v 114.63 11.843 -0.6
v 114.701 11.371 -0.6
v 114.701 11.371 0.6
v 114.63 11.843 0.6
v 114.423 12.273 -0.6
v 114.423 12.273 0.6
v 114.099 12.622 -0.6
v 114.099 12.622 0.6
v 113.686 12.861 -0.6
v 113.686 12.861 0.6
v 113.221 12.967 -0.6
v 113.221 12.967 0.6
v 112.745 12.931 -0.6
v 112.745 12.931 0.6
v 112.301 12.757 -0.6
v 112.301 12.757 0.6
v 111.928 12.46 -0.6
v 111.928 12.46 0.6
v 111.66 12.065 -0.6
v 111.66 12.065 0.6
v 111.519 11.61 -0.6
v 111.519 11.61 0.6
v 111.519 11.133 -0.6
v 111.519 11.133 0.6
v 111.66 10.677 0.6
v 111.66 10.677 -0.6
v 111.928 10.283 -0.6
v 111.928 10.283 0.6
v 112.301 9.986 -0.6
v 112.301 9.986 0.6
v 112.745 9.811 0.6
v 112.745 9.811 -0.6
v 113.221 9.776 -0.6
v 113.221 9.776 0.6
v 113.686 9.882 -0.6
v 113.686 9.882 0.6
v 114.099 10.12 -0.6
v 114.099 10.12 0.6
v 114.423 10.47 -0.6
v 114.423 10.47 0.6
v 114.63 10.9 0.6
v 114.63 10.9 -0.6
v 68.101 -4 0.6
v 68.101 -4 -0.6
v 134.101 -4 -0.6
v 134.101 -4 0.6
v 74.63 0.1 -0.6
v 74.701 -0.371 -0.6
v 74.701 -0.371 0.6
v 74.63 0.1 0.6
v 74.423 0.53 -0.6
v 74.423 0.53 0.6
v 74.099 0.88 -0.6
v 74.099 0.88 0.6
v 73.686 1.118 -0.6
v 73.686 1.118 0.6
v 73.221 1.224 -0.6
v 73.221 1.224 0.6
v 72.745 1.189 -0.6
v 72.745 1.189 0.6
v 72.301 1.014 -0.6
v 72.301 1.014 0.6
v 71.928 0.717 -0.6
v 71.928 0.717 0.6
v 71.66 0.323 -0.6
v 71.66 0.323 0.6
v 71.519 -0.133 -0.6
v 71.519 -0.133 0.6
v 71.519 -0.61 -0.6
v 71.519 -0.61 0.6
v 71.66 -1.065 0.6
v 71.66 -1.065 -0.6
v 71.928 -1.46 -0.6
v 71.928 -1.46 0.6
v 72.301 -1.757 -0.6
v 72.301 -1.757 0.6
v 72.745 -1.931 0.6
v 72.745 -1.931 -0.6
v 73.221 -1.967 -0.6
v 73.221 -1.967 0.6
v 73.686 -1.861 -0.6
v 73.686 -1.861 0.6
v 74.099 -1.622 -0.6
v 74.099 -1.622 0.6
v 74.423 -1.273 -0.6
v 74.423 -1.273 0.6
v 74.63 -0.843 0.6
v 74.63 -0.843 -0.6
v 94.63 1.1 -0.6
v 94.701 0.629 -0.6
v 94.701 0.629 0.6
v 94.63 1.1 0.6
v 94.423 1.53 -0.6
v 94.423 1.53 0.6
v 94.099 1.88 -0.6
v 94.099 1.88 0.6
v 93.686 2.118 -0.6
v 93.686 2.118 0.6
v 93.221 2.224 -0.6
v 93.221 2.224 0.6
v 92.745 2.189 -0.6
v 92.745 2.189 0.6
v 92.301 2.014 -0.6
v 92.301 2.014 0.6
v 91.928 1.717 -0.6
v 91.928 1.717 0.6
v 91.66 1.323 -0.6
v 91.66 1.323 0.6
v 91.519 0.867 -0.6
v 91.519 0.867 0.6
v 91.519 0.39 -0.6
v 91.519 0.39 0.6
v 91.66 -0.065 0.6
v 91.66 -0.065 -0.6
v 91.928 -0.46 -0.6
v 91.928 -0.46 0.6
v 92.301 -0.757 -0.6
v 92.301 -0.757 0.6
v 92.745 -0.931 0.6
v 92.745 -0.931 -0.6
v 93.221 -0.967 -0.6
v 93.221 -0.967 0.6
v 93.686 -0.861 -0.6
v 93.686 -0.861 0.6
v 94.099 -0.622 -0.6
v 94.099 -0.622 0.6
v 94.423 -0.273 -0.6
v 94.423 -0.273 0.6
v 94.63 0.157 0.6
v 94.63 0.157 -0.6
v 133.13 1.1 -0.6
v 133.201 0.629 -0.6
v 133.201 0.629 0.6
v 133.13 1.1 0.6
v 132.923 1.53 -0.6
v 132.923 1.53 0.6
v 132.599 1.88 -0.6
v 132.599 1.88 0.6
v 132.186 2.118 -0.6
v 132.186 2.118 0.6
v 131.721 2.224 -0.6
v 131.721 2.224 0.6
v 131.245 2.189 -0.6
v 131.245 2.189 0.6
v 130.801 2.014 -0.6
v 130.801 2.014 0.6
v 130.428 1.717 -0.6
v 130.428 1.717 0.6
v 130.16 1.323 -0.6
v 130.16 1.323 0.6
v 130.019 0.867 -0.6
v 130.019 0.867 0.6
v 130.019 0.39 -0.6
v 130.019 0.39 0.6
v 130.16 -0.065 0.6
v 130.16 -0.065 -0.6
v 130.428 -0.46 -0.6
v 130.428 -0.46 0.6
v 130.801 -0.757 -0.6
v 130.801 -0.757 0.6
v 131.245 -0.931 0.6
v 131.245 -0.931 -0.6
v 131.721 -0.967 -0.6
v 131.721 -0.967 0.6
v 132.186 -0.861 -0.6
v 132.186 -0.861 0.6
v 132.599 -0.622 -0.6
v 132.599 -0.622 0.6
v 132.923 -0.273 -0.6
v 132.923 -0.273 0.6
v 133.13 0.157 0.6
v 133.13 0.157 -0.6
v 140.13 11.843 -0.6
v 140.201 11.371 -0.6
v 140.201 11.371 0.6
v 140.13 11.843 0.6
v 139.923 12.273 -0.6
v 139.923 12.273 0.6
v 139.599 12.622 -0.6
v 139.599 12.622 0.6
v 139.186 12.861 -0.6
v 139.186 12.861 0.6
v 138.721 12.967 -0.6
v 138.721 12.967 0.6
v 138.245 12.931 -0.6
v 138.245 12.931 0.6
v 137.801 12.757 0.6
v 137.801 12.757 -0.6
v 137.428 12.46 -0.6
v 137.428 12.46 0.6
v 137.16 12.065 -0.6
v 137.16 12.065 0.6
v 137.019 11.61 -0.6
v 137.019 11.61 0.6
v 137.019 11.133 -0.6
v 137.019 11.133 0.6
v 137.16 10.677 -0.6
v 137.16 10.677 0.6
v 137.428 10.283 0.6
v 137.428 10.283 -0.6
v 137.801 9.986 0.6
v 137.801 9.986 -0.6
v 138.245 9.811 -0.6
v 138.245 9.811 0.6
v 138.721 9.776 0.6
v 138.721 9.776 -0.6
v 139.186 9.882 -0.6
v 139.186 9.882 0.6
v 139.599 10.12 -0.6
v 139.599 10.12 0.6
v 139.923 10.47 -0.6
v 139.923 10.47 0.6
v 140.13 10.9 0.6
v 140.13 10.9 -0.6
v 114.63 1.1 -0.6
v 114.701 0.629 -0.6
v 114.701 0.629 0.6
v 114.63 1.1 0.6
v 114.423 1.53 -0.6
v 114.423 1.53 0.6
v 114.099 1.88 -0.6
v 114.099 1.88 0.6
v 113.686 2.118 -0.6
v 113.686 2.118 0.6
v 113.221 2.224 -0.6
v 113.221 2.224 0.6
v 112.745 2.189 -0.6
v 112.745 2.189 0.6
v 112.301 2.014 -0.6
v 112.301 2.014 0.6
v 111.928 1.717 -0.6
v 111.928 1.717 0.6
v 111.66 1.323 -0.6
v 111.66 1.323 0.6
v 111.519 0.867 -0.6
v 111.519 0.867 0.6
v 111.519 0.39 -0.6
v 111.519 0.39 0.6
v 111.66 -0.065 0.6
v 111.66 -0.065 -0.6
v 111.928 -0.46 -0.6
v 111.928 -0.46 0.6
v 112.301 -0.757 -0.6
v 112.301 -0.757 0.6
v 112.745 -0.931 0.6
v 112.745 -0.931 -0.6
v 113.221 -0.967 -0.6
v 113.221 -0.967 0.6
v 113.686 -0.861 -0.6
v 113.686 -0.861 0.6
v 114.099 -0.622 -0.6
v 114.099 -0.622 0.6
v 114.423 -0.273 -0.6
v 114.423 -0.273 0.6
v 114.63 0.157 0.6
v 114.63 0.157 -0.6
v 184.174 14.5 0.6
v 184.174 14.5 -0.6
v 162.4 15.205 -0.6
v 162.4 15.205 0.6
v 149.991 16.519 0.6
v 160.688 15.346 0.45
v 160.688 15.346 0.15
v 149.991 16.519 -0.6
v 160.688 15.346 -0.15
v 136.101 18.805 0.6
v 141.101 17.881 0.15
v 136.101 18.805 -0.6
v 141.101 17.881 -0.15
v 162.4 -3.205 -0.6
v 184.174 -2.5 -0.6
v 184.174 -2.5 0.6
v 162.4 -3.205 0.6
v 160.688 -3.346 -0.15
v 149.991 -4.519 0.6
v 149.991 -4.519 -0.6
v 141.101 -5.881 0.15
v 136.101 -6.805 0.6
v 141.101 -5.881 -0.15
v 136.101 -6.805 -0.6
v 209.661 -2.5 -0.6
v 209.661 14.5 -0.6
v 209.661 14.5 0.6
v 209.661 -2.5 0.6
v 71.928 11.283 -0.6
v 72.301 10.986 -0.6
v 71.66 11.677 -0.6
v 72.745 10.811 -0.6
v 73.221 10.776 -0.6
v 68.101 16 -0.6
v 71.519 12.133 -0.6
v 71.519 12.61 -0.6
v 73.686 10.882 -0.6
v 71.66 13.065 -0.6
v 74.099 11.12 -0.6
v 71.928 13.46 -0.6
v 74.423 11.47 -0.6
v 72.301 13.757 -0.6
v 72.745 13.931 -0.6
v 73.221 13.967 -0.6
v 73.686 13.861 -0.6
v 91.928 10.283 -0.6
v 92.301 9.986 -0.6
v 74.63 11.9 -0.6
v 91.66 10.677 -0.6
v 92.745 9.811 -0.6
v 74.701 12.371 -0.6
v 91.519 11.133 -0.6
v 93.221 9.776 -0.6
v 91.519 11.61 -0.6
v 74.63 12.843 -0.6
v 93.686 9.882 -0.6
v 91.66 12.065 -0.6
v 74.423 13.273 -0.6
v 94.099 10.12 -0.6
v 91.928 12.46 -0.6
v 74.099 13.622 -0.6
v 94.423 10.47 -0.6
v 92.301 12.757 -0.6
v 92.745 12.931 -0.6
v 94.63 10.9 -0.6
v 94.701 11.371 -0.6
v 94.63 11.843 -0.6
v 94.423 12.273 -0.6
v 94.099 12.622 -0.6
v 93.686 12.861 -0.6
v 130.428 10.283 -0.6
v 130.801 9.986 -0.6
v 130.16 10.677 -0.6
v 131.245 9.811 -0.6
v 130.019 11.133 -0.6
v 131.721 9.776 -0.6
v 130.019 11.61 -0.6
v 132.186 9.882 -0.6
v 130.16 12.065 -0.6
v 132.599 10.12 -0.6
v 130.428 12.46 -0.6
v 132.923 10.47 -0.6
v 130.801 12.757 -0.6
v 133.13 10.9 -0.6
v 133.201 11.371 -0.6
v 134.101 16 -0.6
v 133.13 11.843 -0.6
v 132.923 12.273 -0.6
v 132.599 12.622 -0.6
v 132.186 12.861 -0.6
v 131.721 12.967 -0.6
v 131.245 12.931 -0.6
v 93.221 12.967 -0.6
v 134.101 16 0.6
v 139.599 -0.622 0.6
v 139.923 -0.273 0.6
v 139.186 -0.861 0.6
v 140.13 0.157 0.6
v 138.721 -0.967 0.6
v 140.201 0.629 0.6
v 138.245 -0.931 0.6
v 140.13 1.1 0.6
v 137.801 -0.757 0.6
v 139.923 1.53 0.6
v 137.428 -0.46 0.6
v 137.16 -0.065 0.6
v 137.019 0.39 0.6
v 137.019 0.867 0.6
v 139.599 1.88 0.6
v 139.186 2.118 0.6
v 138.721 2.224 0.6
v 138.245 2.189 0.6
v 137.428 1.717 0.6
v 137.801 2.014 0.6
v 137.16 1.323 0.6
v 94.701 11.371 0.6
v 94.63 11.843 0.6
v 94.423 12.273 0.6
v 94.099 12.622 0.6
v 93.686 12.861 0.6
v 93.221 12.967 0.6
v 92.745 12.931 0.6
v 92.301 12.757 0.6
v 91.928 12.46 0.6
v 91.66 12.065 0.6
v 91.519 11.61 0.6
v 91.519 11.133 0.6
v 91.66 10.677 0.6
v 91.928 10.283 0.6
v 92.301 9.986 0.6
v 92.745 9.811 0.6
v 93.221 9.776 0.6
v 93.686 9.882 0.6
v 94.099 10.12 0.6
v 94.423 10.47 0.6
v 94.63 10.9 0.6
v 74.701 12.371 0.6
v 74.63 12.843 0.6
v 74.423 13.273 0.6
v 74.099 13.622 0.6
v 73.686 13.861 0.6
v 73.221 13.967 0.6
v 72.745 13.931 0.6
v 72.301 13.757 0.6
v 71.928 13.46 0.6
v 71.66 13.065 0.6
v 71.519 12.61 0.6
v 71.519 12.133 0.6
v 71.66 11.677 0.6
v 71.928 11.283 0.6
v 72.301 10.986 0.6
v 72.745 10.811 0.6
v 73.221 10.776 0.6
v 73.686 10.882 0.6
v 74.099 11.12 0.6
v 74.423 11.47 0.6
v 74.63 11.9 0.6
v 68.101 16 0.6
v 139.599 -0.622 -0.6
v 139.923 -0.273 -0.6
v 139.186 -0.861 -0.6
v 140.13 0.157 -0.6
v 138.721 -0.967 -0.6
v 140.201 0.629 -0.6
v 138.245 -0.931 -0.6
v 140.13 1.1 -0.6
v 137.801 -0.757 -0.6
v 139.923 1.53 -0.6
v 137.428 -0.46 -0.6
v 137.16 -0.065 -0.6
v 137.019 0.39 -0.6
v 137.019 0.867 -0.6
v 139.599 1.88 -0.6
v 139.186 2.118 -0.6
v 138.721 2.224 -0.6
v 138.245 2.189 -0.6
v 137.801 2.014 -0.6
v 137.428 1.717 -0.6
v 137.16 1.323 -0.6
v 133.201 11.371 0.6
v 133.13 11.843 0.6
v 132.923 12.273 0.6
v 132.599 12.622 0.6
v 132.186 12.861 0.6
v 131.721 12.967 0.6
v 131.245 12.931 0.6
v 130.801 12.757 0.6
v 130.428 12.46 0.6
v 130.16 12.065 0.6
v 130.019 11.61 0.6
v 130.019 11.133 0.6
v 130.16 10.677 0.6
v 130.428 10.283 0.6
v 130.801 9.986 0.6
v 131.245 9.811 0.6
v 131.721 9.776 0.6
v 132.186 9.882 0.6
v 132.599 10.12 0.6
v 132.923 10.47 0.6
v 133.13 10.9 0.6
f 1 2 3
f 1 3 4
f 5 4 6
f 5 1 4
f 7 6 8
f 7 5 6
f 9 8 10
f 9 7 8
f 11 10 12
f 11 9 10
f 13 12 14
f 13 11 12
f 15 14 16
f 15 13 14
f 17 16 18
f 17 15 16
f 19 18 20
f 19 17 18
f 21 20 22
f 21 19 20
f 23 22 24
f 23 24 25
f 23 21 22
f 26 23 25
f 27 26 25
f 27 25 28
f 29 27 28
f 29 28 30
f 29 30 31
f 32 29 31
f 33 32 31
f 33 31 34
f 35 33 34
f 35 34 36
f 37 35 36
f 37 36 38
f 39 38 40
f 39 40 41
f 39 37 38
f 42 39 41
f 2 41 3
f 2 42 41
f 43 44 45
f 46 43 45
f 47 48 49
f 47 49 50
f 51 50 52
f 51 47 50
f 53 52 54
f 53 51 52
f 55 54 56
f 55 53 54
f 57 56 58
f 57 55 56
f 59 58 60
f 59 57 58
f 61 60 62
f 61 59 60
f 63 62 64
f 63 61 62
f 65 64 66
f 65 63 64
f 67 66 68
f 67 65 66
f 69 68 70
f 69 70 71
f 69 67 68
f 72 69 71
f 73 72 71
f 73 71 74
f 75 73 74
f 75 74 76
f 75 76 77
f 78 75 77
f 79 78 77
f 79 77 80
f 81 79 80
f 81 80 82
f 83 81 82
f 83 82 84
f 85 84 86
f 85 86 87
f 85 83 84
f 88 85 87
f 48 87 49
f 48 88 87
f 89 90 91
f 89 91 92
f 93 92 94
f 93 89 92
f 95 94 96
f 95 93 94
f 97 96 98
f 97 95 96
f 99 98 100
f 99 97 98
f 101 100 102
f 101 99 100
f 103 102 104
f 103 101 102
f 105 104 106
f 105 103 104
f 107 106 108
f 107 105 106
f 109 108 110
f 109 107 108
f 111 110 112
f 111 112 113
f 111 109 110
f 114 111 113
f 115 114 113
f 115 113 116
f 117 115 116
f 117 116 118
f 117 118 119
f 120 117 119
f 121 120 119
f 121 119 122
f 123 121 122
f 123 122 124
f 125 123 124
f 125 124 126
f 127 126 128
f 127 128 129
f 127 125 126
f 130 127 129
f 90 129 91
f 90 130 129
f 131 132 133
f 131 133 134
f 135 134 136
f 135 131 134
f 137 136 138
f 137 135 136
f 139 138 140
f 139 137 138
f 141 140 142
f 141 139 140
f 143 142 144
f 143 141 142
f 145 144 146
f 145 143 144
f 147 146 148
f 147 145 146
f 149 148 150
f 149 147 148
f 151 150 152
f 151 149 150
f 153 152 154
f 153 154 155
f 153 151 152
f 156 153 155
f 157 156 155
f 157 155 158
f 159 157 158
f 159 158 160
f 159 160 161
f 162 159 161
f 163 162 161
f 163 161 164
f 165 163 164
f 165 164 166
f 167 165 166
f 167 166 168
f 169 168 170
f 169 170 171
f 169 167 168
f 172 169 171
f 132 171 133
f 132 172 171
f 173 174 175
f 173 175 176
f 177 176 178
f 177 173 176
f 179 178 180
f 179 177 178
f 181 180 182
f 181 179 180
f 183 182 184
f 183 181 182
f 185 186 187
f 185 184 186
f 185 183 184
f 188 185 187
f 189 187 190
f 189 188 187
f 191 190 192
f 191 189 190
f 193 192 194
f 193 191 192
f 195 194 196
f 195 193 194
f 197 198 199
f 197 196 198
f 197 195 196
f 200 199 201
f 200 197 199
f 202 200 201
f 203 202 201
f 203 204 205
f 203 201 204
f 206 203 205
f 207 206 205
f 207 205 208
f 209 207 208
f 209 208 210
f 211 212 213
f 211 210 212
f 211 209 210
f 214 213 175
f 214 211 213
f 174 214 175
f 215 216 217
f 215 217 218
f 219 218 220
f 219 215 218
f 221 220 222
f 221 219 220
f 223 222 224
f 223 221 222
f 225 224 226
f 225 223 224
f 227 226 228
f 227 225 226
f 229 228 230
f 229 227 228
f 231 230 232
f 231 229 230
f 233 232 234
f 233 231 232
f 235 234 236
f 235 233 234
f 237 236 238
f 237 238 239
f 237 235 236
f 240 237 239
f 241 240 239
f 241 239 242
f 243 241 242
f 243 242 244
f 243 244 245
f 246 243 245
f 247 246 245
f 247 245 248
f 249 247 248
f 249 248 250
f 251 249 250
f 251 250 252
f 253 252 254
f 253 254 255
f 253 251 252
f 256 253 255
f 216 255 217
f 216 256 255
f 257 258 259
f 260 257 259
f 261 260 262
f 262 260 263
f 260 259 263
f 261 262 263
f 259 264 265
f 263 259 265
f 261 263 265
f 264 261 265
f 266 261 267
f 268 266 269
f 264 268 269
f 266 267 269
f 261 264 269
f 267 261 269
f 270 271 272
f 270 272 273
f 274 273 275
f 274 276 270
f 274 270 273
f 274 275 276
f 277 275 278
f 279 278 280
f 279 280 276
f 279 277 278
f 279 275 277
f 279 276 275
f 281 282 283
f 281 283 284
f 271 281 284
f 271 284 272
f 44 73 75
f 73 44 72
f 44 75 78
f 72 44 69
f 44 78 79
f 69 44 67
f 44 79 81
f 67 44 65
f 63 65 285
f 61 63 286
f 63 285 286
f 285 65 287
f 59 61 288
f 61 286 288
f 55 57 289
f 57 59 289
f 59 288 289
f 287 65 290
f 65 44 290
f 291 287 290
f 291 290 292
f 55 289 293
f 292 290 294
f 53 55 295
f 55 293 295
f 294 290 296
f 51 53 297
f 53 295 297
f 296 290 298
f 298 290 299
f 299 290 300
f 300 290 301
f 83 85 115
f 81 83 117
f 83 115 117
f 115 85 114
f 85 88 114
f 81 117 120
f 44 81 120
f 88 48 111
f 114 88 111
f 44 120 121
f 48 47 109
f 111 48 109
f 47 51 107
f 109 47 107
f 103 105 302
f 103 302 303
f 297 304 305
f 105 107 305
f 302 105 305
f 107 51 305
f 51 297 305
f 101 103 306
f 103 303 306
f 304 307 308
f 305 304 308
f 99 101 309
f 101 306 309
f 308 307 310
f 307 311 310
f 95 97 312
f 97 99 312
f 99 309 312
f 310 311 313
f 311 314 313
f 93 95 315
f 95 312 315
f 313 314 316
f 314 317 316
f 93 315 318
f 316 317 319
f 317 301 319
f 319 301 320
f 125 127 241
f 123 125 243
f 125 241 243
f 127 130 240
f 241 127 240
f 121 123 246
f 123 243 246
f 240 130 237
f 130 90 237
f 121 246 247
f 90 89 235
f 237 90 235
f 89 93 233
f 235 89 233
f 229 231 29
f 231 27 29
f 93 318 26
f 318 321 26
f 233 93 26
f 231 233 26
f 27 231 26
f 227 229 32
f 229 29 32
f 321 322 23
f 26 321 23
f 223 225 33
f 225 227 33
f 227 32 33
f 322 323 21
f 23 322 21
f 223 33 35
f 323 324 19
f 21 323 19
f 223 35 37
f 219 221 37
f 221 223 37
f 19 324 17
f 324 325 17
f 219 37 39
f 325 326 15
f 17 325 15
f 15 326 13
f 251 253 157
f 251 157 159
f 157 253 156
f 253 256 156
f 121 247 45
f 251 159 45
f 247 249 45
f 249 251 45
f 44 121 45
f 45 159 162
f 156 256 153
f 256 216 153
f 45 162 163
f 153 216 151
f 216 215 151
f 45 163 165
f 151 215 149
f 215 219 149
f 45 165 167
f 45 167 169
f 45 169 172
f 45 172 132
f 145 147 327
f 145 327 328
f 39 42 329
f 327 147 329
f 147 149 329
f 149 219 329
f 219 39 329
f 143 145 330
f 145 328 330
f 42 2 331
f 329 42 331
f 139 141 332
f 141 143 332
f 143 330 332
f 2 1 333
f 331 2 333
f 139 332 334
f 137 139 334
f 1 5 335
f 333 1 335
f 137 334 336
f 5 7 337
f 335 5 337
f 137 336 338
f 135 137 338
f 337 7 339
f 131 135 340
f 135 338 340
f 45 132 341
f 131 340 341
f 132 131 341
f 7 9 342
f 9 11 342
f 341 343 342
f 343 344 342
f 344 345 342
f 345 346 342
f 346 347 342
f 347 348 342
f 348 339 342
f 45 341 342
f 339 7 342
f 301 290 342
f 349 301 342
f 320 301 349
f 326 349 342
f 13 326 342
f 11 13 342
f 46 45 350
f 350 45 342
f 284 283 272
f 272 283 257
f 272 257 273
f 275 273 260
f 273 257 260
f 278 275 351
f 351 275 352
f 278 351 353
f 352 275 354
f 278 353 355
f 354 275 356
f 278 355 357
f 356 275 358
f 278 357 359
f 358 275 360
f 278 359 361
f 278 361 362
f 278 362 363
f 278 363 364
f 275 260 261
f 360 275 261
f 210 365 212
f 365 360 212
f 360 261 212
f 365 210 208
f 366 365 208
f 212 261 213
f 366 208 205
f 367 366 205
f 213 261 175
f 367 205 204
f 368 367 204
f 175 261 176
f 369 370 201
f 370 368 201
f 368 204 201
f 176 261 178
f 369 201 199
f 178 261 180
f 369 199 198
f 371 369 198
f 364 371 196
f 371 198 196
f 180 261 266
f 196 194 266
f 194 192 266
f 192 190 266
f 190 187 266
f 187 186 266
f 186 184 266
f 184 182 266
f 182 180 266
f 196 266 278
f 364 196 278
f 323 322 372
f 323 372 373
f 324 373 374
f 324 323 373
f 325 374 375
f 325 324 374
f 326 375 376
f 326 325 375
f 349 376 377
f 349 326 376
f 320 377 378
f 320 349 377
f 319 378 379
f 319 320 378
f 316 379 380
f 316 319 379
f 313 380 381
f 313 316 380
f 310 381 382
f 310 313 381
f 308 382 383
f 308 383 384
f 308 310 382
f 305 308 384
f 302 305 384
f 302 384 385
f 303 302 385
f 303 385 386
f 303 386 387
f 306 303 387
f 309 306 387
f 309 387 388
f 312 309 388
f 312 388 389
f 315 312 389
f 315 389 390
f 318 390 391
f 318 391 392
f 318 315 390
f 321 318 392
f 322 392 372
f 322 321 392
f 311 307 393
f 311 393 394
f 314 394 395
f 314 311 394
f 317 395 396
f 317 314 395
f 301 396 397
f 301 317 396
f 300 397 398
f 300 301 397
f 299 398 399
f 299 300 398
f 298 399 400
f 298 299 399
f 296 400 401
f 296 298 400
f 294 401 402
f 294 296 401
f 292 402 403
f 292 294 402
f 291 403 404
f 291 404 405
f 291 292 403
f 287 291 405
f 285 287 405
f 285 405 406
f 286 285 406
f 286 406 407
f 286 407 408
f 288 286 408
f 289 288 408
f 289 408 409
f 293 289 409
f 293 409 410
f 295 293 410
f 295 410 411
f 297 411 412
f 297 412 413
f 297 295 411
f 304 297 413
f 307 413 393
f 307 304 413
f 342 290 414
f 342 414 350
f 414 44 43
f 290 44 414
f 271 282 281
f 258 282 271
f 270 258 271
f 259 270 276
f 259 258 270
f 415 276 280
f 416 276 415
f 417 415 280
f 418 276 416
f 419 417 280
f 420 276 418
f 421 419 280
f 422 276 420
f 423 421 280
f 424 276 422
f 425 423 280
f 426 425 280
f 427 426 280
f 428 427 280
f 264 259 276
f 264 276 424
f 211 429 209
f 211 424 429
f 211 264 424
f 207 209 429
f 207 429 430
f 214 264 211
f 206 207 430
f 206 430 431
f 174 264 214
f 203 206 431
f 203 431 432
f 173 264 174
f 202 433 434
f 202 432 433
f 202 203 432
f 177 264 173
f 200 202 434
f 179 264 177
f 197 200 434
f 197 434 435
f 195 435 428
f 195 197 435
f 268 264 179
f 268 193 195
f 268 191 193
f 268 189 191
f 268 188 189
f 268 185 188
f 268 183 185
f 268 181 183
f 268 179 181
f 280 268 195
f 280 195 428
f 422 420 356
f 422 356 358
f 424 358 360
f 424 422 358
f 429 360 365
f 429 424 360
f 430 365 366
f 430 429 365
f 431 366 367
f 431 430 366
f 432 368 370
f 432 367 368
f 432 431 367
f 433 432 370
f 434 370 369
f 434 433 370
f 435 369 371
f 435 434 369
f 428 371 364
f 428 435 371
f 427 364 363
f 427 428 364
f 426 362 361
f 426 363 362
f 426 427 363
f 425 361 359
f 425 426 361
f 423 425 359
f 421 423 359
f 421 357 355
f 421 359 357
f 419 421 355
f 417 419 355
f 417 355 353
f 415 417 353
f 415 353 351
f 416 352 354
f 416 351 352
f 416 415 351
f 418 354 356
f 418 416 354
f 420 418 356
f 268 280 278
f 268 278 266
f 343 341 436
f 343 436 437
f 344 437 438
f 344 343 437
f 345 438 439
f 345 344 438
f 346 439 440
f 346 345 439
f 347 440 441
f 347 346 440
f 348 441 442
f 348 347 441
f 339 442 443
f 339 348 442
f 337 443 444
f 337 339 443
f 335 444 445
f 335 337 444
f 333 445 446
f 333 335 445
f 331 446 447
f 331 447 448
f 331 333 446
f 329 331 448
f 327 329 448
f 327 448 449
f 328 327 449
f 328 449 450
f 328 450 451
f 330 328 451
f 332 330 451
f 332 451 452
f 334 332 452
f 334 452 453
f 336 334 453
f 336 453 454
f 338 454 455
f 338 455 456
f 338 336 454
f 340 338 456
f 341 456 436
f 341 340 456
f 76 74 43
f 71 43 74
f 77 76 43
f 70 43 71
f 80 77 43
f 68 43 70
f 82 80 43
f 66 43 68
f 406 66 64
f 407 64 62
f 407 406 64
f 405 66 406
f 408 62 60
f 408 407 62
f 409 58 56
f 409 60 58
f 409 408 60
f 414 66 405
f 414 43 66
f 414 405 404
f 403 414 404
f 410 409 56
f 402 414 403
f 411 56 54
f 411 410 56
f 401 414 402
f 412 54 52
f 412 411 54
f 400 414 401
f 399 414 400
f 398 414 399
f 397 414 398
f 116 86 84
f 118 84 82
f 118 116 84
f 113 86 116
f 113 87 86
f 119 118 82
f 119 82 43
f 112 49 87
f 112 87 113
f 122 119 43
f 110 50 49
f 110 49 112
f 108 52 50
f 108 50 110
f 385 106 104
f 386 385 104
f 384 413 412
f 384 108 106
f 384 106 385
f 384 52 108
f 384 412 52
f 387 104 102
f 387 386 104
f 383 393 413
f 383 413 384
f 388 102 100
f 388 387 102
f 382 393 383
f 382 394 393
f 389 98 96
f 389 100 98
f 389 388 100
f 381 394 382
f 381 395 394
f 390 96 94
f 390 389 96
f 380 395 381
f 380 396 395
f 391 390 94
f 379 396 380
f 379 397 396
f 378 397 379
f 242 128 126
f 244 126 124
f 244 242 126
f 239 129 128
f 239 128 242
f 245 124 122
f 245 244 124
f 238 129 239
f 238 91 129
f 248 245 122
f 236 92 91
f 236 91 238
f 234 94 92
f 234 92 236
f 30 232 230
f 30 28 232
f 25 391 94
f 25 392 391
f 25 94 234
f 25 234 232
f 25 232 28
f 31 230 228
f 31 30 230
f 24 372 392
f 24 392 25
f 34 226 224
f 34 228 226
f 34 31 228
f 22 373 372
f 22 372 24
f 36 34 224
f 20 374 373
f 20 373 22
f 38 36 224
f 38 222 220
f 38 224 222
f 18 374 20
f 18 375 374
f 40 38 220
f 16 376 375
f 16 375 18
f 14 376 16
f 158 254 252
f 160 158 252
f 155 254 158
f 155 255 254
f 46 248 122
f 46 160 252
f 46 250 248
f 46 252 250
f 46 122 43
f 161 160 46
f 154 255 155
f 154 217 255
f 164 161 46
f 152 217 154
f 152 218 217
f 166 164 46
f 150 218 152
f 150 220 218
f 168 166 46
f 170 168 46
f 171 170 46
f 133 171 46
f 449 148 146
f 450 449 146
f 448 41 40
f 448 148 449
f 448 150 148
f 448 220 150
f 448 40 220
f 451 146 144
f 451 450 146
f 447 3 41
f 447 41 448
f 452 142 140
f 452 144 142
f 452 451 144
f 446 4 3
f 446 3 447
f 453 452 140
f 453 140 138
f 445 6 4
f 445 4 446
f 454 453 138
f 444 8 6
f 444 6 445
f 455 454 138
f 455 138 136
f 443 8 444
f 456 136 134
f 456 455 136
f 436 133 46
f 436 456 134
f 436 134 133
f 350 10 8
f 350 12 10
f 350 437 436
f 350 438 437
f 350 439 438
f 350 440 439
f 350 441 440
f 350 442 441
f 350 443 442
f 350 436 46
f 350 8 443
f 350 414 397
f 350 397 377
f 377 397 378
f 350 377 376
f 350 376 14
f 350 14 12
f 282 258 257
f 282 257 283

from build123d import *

# Parameters (mm, degrees)
BOSS_EXTRUDE1_DEPTH      = 0.6
BOSS_EXTRUDE1_DEPTH_BACK = 0.6
BOSS_EXTRUDE2_DEPTH      = 0.6
BOSS_EXTRUDE2_DEPTH_BACK = 0.6
SKETCH3_W                = 65.999999997
SKETCH3_H                = 20
SKETCH3_R                = 1.6
CUT_EXTRUDE1_DEPTH       = 211.503888964
CUT_EXTRUDE1_DEPTH_BACK  = 211.503888964
SKETCH4_R                = 1.6


with BuildPart() as part:
    # Sketch2 → Boss-Extrude1 (new, two sides: drawn at the far end of the back side and taken through both)
    with BuildSketch(Plane.XY.offset(-BOSS_EXTRUDE1_DEPTH_BACK)):
        with BuildLine():
            Line((184.174027055, 14.5), (209.661357245, 14.5))
            Line((209.661357245, 14.5), (209.661357245, -2.5))
            Line((209.661357245, -2.5), (184.174027055, -2.5))
            add(Edge.make_bspline(
                [(184.174027055, -2.5), (183.824253427, -2.5), (182.946206391, -2.5), (181.667799963, -2.5), (180.804171148, -2.5), (176.695940371, -2.5), (170.015725267, -2.670138318), (160.683426305, -3.282569394), (151.378685364, -4.272936281), (144.757083805, -5.247503899), (139.459652196, -6.166033814), (137.792001296, -6.473604313), (136.101357245, -6.805384896)],
                knots=[0.04382985, 0.04382985, 0.04382985, 0.04382985, 0.045875996, 0.04917636, 0.052476723, 0.052476723, 0.08232242, 0.112168116, 0.142013813, 0.17185951, 0.17185951, 0.185262545, 0.185262545, 0.185262545, 0.185262545], degree=3))
            Line((136.101357245, -6.805384896), (136.101357245, 18.805384896))
            add(Edge.make_bspline(
                [(184.174027055, 14.5), (183.824253427, 14.5), (182.94620639, 14.5), (181.667799963, 14.5), (180.804171148, 14.5), (176.695940371, 14.5), (170.015725266, 14.670138318), (160.683426305, 15.282569394), (151.378685363, 16.272936281), (144.757083805, 17.247503899), (139.459652196, 18.166033814), (137.792001296, 18.473604313), (136.101357245, 18.805384896)],
                knots=[0.04382985, 0.04382985, 0.04382985, 0.04382985, 0.045875996, 0.04917636, 0.052476723, 0.052476723, 0.08232242, 0.112168116, 0.142013813, 0.17185951, 0.17185951, 0.185262545, 0.185262545, 0.185262545, 0.185262545], degree=3))
        make_face()
    extrude(amount=BOSS_EXTRUDE1_DEPTH + BOSS_EXTRUDE1_DEPTH_BACK)

    # Sketch4 → Cut-Extrude1 (cut, two sides: drawn at the far end of the back side and taken through both)
    with BuildSketch(Plane.XY.offset(-CUT_EXTRUDE1_DEPTH_BACK)):
        with Locations((138.601357245, 11.371281292)):
            Circle(SKETCH4_R)
        with Locations((138.601357245, 0.628718708)):
            Circle(SKETCH4_R)
    extrude(amount=CUT_EXTRUDE1_DEPTH + CUT_EXTRUDE1_DEPTH_BACK, mode=Mode.SUBTRACT)


with BuildPart() as body_2:
    # Sketch3 → Boss-Extrude2 (new, two sides: drawn at the far end of the back side and taken through both)
    with BuildSketch(Plane.XY.offset(-BOSS_EXTRUDE2_DEPTH_BACK)):
        with Locations((101.101357244, 6)):
            Rectangle(SKETCH3_W, SKETCH3_H)
        with Locations((73.101357245, 12.371281292)):
            Circle(SKETCH3_R, mode=Mode.SUBTRACT)
        with Locations((73.101357245, -0.371281292)):
            Circle(SKETCH3_R, mode=Mode.SUBTRACT)
        with Locations((93.101357245, 0.628718708)):
            Circle(SKETCH3_R, mode=Mode.SUBTRACT)
        with Locations((93.101357245, 11.371281292)):
            Circle(SKETCH3_R, mode=Mode.SUBTRACT)
        with Locations((131.601357245, 0.628718708)):
            Circle(SKETCH3_R, mode=Mode.SUBTRACT)
        with Locations((131.601357245, 11.371281292)):
            Circle(SKETCH3_R, mode=Mode.SUBTRACT)
        with Locations((113.101357245, 0.628718708)):
            Circle(SKETCH3_R, mode=Mode.SUBTRACT)
        with Locations((113.101357245, 11.371281292)):
            Circle(SKETCH3_R, mode=Mode.SUBTRACT)
    extrude(amount=BOSS_EXTRUDE2_DEPTH + BOSS_EXTRUDE2_DEPTH_BACK)


solid = Compound([part.part, body_2.part])
